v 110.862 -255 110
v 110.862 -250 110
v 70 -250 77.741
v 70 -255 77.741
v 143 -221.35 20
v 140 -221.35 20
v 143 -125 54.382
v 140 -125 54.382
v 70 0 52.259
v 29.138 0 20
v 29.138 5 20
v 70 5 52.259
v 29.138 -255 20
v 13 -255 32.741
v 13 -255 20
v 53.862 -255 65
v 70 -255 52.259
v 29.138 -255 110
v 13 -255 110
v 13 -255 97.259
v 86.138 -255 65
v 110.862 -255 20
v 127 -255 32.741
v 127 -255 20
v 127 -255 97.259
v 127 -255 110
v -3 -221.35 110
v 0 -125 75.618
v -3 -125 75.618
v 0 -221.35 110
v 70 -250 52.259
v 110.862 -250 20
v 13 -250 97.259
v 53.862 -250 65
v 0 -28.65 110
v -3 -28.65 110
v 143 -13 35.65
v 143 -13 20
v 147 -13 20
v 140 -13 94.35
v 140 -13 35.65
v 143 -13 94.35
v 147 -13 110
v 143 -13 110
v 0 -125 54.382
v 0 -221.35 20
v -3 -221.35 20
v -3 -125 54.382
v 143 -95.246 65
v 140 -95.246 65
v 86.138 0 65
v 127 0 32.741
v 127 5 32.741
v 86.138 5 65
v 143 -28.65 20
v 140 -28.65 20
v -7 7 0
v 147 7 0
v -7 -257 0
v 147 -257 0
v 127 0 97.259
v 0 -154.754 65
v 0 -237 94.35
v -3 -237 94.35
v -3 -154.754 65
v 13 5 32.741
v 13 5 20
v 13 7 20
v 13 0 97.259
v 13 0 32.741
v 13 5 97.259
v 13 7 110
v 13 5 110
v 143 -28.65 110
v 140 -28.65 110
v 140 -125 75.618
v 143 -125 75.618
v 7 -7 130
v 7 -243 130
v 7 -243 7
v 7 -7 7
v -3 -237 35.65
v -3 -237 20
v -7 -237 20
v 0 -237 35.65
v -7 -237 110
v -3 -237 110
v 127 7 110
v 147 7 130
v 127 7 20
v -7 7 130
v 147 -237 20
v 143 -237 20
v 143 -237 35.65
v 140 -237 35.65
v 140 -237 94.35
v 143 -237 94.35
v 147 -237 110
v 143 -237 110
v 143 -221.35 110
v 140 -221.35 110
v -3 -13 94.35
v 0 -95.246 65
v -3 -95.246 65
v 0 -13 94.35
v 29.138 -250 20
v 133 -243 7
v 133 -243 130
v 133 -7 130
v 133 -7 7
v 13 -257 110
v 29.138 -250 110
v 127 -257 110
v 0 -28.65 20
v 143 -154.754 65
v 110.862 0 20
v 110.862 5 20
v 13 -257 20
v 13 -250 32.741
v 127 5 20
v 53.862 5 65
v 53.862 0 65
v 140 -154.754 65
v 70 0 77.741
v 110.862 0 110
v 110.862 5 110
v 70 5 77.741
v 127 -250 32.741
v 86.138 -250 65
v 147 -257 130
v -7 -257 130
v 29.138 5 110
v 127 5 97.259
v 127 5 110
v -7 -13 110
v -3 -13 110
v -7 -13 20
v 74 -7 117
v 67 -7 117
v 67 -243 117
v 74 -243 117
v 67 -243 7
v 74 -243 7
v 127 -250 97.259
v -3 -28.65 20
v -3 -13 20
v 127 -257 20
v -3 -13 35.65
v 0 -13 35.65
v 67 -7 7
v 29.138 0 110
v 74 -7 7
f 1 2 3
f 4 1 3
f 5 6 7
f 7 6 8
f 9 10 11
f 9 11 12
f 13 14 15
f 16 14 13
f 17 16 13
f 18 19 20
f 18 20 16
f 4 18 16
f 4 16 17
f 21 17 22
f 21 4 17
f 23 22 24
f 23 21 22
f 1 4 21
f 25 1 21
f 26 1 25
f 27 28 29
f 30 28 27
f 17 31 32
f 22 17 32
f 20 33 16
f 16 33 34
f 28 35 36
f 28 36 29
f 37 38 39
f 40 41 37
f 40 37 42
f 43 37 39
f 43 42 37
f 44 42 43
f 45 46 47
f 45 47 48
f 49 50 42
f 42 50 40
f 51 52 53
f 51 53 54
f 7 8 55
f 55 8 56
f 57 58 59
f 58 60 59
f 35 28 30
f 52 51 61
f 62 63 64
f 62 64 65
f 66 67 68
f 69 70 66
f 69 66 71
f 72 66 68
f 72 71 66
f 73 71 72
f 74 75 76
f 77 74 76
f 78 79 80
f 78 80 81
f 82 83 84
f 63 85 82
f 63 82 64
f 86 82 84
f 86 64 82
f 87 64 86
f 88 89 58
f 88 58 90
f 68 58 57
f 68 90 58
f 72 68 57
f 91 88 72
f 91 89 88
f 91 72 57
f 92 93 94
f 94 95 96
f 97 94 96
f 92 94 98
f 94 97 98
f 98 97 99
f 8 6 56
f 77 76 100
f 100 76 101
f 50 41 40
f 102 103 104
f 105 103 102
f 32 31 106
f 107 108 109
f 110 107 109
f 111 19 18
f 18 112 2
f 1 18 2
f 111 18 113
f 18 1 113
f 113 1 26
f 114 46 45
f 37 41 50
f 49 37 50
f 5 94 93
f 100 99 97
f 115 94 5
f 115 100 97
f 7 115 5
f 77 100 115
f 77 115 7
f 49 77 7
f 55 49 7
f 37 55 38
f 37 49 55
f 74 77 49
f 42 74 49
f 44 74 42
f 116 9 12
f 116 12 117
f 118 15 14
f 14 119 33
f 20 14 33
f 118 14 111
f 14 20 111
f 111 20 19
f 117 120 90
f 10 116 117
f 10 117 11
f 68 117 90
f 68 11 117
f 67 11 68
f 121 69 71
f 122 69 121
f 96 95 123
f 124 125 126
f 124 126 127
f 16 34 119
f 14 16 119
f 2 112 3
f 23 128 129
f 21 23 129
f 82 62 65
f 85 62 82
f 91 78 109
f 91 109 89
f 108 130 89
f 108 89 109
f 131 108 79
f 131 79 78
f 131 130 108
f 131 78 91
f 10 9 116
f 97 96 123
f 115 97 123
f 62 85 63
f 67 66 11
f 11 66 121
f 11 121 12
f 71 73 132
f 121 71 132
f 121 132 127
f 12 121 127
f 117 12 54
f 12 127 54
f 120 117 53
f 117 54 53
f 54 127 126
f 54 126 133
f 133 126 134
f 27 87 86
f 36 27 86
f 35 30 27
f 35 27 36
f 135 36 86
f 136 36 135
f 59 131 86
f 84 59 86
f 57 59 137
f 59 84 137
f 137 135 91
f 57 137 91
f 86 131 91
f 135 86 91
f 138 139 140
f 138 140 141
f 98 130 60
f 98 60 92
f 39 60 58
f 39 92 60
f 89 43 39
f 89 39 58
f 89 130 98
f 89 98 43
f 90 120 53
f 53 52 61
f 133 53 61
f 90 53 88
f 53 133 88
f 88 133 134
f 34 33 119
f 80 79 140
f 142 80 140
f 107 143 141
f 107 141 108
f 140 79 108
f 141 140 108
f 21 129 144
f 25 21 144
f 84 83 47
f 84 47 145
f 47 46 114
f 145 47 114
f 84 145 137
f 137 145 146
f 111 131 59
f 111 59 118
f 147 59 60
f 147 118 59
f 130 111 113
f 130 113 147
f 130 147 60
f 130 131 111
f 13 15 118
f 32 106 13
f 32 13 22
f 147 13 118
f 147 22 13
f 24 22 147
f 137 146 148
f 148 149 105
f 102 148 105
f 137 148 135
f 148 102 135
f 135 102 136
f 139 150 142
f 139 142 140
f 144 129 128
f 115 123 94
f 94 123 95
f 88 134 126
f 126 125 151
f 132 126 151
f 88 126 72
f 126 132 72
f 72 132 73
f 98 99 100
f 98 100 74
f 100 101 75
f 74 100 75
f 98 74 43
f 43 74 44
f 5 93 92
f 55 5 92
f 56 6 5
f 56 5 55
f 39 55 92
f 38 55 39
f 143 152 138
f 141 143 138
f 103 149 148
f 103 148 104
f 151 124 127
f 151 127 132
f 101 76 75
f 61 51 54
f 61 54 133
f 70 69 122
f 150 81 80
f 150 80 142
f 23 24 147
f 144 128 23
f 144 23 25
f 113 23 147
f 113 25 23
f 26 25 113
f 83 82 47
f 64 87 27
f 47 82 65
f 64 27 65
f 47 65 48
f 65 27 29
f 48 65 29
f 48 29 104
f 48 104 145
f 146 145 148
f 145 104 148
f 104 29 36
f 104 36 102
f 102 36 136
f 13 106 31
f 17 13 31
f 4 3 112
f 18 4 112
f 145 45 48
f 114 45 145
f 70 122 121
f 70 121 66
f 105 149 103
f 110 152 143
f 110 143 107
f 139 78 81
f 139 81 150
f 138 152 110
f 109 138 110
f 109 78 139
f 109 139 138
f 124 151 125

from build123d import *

# Parameters (mm, degrees)
F0_W      = 140
F0_H      = 130
F1_DEPTH  = 250
F2_W      = 126
F2_H      = 236
F3_DEPTH  = 123
F4_W      = 250
F4_H      = 130
F4_W_2    = 224
F4_H_2    = 90
F4_W_3    = 7
F5_DEPTH  = 7
F7_W      = 140
F7_H      = 130
F7_W_2    = 114
F7_H_2    = 90
F8_DEPTH  = 7
F9_W      = 140
F9_H      = 130
F9_W_2    = 114
F9_H_2    = 90
F10_DEPTH = 7
F12_DEPTH = 3
F14_DEPTH = 3
F15_W     = 7
F15_H     = 110
F16_DEPTH = 236
F18_DEPTH = 5


# Not quite as in the source:
# - a pattern or mirror of a feature is missing from the dataset's text; its kind, count and spacing are read off the source's solid


with BuildPart() as f1:
    # F0 (on Front) → F1 (new body)
    with BuildSketch(Plane.XZ):
        with Locations((70, 65)):
            Rectangle(F0_W, F0_H)
    extrude(amount=F1_DEPTH)

    # F2 (on face) → F3 (cut)
    with BuildSketch(Plane.XY.offset(130)):
        with Locations((70, -125)):
            Rectangle(F2_W, F2_H)
    extrude(amount=-F3_DEPTH, mode=Mode.SUBTRACT)

    # F4 (on face) → F5 (join)
    with BuildSketch(Plane.YZ.offset(140)):
        with Locations((-125, 65)):
            Rectangle(F4_W, F4_H)
        with Locations((-125, 65)):
            Rectangle(F4_W_2, F4_H_2, mode=Mode.SUBTRACT)
        with Locations((-253.5, 65)):
            Rectangle(F4_W_3, F4_H)
        with Locations((3.5, 65)):
            Rectangle(F4_W_3, F4_H)
    f5 = extrude(amount=F5_DEPTH)

    # F5_copies: F5 across plane
    add(f5.mirror(Plane(origin=(70, 0, 0), x_dir=(0, 0, -1), z_dir=(-1, 0, 0))))

    # F7 (on face) → F8 (join)
    with BuildSketch(Plane.XZ.offset(250)):
        with Locations((70, 65)):
            Rectangle(F7_W, F7_H)
        with Locations((70, 65)):
            Rectangle(F7_W_2, F7_H_2, mode=Mode.SUBTRACT)
    extrude(amount=F8_DEPTH)

    # F9 (on face) → F10 (join)
    with BuildSketch(Plane(origin=(0, 0, 0), x_dir=(-1, 0, 0), z_dir=(0, 1, 0))):
        with Locations((-70, 65)):
            Rectangle(F9_W, F9_H)
        with Locations((-70, 65)):
            Rectangle(F9_W_2, F9_H_2, mode=Mode.SUBTRACT)
    extrude(amount=F10_DEPTH)

    # F11 (on face) → F12 (join)
    with BuildSketch(Plane.YZ.offset(140)):
        Polygon((-13, 35.6504185324), (-221.3495814676, 110), (-237, 110), (-237, 94.3495814676), (-28.6504185324, 20), (-13, 20), align=None)
    f12 = extrude(amount=F12_DEPTH)

    # F12_copies: F12 across plane
    add(f12.mirror(Plane(origin=(70, 0, 0), x_dir=(0, 0, -1), z_dir=(-1, 0, 0))))

    # F13 (on face) → F14 (join)
    with BuildSketch(Plane.YZ.offset(140)):
        Polygon((-13, 110), (-28.6504185324, 110), (-237, 35.6504185324), (-237, 20), (-221.3495814676, 20), (-13, 94.3495814676), align=None)
    f14 = extrude(amount=F14_DEPTH)

    # F14_copies: F14 across plane
    add(f14.mirror(Plane(origin=(70, 0, 0), x_dir=(0, 0, -1), z_dir=(-1, 0, 0))))

    # F15 (on face) → F16 (join, through all)
    with BuildSketch(Plane.XZ.offset(7)):
        with Locations((70.5, 62)):
            Rectangle(F15_W, F15_H)
    extrude(amount=F16_DEPTH)

    # F17 (on face) → F18 (join)
    with BuildSketch(Plane.XZ.offset(250)):
        Polygon((70, 77.7407562494), (29.1382912492, 110), (13, 110), (13, 97.2592437506), (53.8617087508, 65), (13, 32.7407562494), (13, 20), (29.1382912492, 20), (70, 52.2592437506), (110.8617087508, 20), (127, 20), (127, 32.7407562494), (86.1382912492, 65), (127, 97.2592437506), (127, 110), (110.8617087508, 110), align=None)
    f18 = extrude(amount=F18_DEPTH)

    # F18_copies: F18 across plane
    add(f18.mirror(Plane.ZX.offset(-125)))


solid = f1.part
